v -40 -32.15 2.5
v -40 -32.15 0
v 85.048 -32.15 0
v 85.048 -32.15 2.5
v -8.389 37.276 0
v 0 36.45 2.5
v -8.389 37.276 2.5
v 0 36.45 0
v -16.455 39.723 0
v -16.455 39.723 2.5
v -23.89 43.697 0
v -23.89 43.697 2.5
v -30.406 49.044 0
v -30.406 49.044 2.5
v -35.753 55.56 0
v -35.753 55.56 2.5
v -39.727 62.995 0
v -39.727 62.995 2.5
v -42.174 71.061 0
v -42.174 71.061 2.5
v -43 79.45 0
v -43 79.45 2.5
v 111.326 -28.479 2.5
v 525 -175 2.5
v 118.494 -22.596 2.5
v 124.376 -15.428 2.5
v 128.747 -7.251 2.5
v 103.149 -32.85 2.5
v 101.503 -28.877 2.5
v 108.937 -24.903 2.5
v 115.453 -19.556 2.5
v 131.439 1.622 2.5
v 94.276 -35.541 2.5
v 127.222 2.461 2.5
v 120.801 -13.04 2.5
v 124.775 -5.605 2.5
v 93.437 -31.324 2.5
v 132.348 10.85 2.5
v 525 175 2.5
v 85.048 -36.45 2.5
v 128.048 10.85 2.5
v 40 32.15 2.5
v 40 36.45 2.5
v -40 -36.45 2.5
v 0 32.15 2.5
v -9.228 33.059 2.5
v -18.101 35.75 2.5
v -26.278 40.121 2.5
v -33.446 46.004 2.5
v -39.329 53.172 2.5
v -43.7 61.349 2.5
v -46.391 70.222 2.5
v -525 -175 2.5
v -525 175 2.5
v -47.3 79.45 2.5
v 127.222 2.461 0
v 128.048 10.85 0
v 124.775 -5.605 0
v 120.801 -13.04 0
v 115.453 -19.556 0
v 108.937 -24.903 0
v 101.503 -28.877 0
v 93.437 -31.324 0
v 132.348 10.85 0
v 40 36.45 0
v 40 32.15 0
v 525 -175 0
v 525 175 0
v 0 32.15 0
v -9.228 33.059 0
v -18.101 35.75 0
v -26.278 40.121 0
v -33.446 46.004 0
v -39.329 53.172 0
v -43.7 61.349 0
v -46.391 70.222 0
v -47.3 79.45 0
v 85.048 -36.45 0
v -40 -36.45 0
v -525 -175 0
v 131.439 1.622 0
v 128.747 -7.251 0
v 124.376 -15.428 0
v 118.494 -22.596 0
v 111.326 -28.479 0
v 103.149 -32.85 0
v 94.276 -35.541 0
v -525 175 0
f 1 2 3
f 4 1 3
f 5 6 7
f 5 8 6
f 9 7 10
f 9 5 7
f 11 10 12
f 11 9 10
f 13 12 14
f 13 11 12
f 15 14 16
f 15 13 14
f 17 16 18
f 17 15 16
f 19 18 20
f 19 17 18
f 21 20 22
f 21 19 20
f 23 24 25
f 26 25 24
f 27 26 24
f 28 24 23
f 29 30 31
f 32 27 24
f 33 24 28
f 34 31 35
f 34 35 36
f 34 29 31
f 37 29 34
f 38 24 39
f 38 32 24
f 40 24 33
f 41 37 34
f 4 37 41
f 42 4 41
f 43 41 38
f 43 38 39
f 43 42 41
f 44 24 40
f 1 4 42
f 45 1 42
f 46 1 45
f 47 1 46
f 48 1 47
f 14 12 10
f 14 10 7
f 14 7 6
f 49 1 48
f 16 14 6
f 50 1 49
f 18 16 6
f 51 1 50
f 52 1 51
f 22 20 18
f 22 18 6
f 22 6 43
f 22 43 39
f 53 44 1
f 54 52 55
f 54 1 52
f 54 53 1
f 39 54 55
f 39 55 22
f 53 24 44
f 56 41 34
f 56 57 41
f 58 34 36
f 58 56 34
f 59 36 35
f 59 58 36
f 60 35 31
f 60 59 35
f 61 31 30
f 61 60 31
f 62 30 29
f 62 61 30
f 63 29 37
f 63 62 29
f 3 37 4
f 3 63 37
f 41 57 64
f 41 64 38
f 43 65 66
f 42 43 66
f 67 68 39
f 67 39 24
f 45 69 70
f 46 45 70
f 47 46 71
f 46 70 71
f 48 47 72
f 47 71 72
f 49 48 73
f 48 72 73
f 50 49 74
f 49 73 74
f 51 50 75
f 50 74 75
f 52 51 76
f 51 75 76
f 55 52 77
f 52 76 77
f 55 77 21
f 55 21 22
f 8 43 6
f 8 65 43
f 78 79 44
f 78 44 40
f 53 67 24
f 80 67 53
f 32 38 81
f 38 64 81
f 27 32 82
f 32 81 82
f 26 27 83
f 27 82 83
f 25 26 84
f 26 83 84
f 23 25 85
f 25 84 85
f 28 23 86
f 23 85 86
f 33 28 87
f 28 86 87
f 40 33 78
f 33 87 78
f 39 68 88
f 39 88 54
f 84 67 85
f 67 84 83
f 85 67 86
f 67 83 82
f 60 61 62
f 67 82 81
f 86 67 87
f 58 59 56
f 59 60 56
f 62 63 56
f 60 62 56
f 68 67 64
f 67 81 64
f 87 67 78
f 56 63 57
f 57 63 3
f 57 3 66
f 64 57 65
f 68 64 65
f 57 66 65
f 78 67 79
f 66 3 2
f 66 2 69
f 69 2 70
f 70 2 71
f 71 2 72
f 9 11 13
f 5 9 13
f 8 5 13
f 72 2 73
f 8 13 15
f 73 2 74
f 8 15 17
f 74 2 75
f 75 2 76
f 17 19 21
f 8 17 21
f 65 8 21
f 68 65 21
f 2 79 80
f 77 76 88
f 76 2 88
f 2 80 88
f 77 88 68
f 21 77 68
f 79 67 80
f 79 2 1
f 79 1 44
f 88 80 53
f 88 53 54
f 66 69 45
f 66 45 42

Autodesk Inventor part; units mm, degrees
ref_plane "YZ Plane" through (0, 0, 0) normal (1, 0, 0) x (0, 1, 0)
ref_plane "XZ Plane" through (0, 0, 0) normal (0, 1, 0) x (-1, 0, 0)
ref_plane "XY Plane" through (0, 0, 0) normal (0, 0, 1) x (1, 0, 0)
sketch "Sketch1" plane through (0, 0, 0) normal (0, 0, 1) x (1, 0, 0)
  line L0 (-525, 175) -> (525, 175) projected
  line L1 (-525, -175) -> (-525, 175) projected
  line L2 (525, -175) -> (-525, -175) projected
  line L3 (525, 175) -> (525, -175) projected
  arc A0 (-434.5, -36.45) -> (-475.35, -77.3) centre (-434.5, -77.3) ccw projected
  line L4 (-475.35, -85.5) -> (-475.35, -77.3) projected
  arc A1 (-475.35, -85.5) -> (-434.5, -126.35) centre (-434.5, -85.5) ccw projected
  line L5 (434.5, -126.35) -> (-434.5, -126.35) projected
  arc A2 (434.5, -126.35) -> (475.35, -85.5) centre (434.5, -85.5) ccw projected
  line L6 (475.35, -65.8667) -> (475.35, -85.5) projected
  arc A3 (475.35, -65.8667) -> (434.5, -25.0167) centre (434.5, -65.8667) ccw projected
  line L7 (-445.75, -25.0167) -> (434.5, -25.0167) projected
  arc A4 (-445.75, -25.0167) -> (-486.6, -65.8667) centre (-445.75, -65.8667) ccw projected
  line L8 (-486.6, -96.25) -> (-486.6, -65.8667) projected
  arc A5 (-486.6, -96.25) -> (-445.75, -137.1) centre (-445.75, -96.25) ccw projected
  line L9 (445.75, -137.1) -> (-445.75, -137.1) projected
  arc A6 (445.75, -137.1) -> (486.6, -96.25) centre (445.75, -96.25) ccw projected
  line L10 (486.6, -54.4333) -> (486.6, -96.25) projected
  arc A7 (486.6, -54.4333) -> (445.75, -13.5833) centre (445.75, -54.4333) ccw projected
  line L11 (-457, -13.5833) -> (445.75, -13.5833) projected
  arc A8 (-457, -13.5833) -> (-497.85, -54.4333) centre (-457, -54.4333) ccw projected
  line L12 (-497.85, -107) -> (-497.85, -54.4333) projected
  arc A9 (-497.85, -107) -> (-457, -147.85) centre (-457, -107) ccw projected
  line L13 (457, -147.85) -> (-457, -147.85) projected
  arc A10 (457, -147.85) -> (497.85, -107) centre (457, -107) ccw projected
  line L14 (497.85, -43) -> (497.85, -107) projected
  arc A11 (497.85, -43) -> (457, -2.15) centre (457, -43) ccw projected
  line L15 (-457, -2.15) -> (457, -2.15) projected
  arc A12 (-502.15, 43) -> (-457, -2.15) centre (-457, 43) ccw projected
  line L16 (-502.15, 107) -> (-502.15, 43) projected
  arc A13 (-457, 152.15) -> (-502.15, 107) centre (-457, 107) ccw projected
  line L17 (457, 152.15) -> (-457, 152.15) projected
  arc A14 (502.15, 107) -> (457, 152.15) centre (457, 107) ccw projected
  line L18 (502.15, 54.4333) -> (502.15, 107) projected
  arc A15 (457, 9.2833) -> (502.15, 54.4333) centre (457, 54.4333) ccw projected
  line L19 (-445.75, 9.2833) -> (457, 9.2833) projected
  arc A16 (-490.9, 54.4333) -> (-445.75, 9.2833) centre (-445.75, 54.4333) ccw projected
  line L20 (-490.9, 96.25) -> (-490.9, 54.4333) projected
  arc A17 (-445.75, 141.4) -> (-490.9, 96.25) centre (-445.75, 96.25) ccw projected
  line L21 (445.75, 141.4) -> (-445.75, 141.4) projected
  arc A18 (490.9, 96.25) -> (445.75, 141.4) centre (445.75, 96.25) ccw projected
  line L22 (490.9, 65.8667) -> (490.9, 96.25) projected
  arc A19 (445.75, 20.7167) -> (490.9, 65.8667) centre (445.75, 65.8667) ccw projected
  line L23 (-434.5, 20.7167) -> (445.75, 20.7167) projected
  arc A20 (-479.65, 65.8667) -> (-434.5, 20.7167) centre (-434.5, 65.8667) ccw projected
  line L24 (-479.65, 85.5) -> (-479.65, 65.8667) projected
  arc A21 (-434.5, 130.65) -> (-479.65, 85.5) centre (-434.5, 85.5) ccw projected
  line L25 (434.5, 130.65) -> (-434.5, 130.65) projected
  arc A22 (479.65, 85.5) -> (434.5, 130.65) centre (434.5, 85.5) ccw projected
  line L26 (479.65, 77.3) -> (479.65, 85.5) projected
  arc A23 (434.5, 32.15) -> (479.65, 77.3) centre (434.5, 77.3) ccw projected
  line L27 (0, 32.15) -> (434.5, 32.15) projected
  line L28 (0, 36.45) -> (0, 32.15) projected
  line L29 (434.5, 36.45) -> (0, 36.45) projected
  arc A24 (434.5, 36.45) -> (475.35, 77.3) centre (434.5, 77.3) ccw projected
  line L30 (475.35, 85.5) -> (475.35, 77.3) projected
  arc A25 (475.35, 85.5) -> (434.5, 126.35) centre (434.5, 85.5) ccw projected
  line L31 (-434.5, 126.35) -> (434.5, 126.35) projected
  arc A26 (-434.5, 126.35) -> (-475.35, 85.5) centre (-434.5, 85.5) ccw projected
  line L32 (-475.35, 65.8667) -> (-475.35, 85.5) projected
  arc A27 (-475.35, 65.8667) -> (-434.5, 25.0167) centre (-434.5, 65.8667) ccw projected
  line L33 (445.75, 25.0167) -> (-434.5, 25.0167) projected
  arc A28 (445.75, 25.0167) -> (486.6, 65.8667) centre (445.75, 65.8667) ccw projected
  line L34 (486.6, 96.25) -> (486.6, 65.8667) projected
  arc A29 (486.6, 96.25) -> (445.75, 137.1) centre (445.75, 96.25) ccw projected
  line L35 (-445.75, 137.1) -> (445.75, 137.1) projected
  arc A30 (-445.75, 137.1) -> (-486.6, 96.25) centre (-445.75, 96.25) ccw projected
  line L36 (-486.6, 54.4333) -> (-486.6, 96.25) projected
  arc A31 (-486.6, 54.4333) -> (-445.75, 13.5833) centre (-445.75, 54.4333) ccw projected
  line L37 (457, 13.5833) -> (-445.75, 13.5833) projected
  arc A32 (457, 13.5833) -> (497.85, 54.4333) centre (457, 54.4333) ccw projected
  line L38 (497.85, 107) -> (497.85, 54.4333) projected
  arc A33 (497.85, 107) -> (457, 147.85) centre (457, 107) ccw projected
  line L39 (-457, 147.85) -> (457, 147.85) projected
  arc A34 (-457, 147.85) -> (-497.85, 107) centre (-457, 107) ccw projected
  line L40 (-497.85, 43) -> (-497.85, 107) projected
  arc A35 (-497.85, 43) -> (-457, 2.15) centre (-457, 43) ccw projected
  line L41 (457, 2.15) -> (-457, 2.15) projected
  arc A36 (502.15, -43) -> (457, 2.15) centre (457, -43) ccw projected
  line L42 (502.15, -107) -> (502.15, -43) projected
  arc A37 (457, -152.15) -> (502.15, -107) centre (457, -107) ccw projected
  line L43 (-457, -152.15) -> (457, -152.15) projected
  arc A38 (-502.15, -107) -> (-457, -152.15) centre (-457, -107) ccw projected
  line L44 (-502.15, -54.4333) -> (-502.15, -107) projected
  arc A39 (-457, -9.2833) -> (-502.15, -54.4333) centre (-457, -54.4333) ccw projected
  line L45 (445.75, -9.2833) -> (-457, -9.2833) projected
  arc A40 (490.9, -54.4333) -> (445.75, -9.2833) centre (445.75, -54.4333) ccw projected
  line L46 (490.9, -96.25) -> (490.9, -54.4333) projected
  arc A41 (445.75, -141.4) -> (490.9, -96.25) centre (445.75, -96.25) ccw projected
  line L47 (-445.75, -141.4) -> (445.75, -141.4) projected
  arc A42 (-490.9, -96.25) -> (-445.75, -141.4) centre (-445.75, -96.25) ccw projected
  line L48 (-490.9, -65.8667) -> (-490.9, -96.25) projected
  arc A43 (-445.75, -20.7167) -> (-490.9, -65.8667) centre (-445.75, -65.8667) ccw projected
  line L49 (434.5, -20.7167) -> (-445.75, -20.7167) projected
  arc A44 (479.65, -65.8667) -> (434.5, -20.7167) centre (434.5, -65.8667) ccw projected
  line L50 (479.65, -85.5) -> (479.65, -65.8667) projected
  arc A45 (434.5, -130.65) -> (479.65, -85.5) centre (434.5, -85.5) ccw projected
  line L51 (-434.5, -130.65) -> (434.5, -130.65) projected
  arc A46 (-479.65, -85.5) -> (-434.5, -130.65) centre (-434.5, -85.5) ccw projected
  line L52 (-479.65, -77.3) -> (-479.65, -85.5) projected
  arc A47 (-434.5, -32.15) -> (-479.65, -77.3) centre (-434.5, -77.3) ccw projected
  line L53 (0, -32.15) -> (-434.5, -32.15) projected
  line L54 (0, -36.45) -> (0, -32.15) projected
  line L55 (-434.5, -36.45) -> (0, -36.45) projected
  line L56 (-525, 175) -> (525, 175) projected
  line L57 (-525, -175) -> (-525, 175) projected
  line L58 (525, -175) -> (-525, -175) projected
  line L59 (525, 175) -> (525, -175) projected
  arc A48 (-434.5, -36.45) -> (-475.35, -77.3) centre (-434.5, -77.3) ccw projected
  line L60 (-475.35, -85.5) -> (-475.35, -77.3) projected
  arc A49 (-475.35, -85.5) -> (-434.5, -126.35) centre (-434.5, -85.5) ccw projected
  line L61 (434.5, -126.35) -> (-434.5, -126.35) projected
  arc A50 (434.5, -126.35) -> (475.35, -85.5) centre (434.5, -85.5) ccw projected
  line L62 (475.35, -65.8667) -> (475.35, -85.5) projected
  arc A51 (475.35, -65.8667) -> (434.5, -25.0167) centre (434.5, -65.8667) ccw projected
  line L63 (-445.75, -25.0167) -> (434.5, -25.0167) projected
  arc A52 (-445.75, -25.0167) -> (-486.6, -65.8667) centre (-445.75, -65.8667) ccw projected
  line L64 (-486.6, -96.25) -> (-486.6, -65.8667) projected
  arc A53 (-486.6, -96.25) -> (-445.75, -137.1) centre (-445.75, -96.25) ccw projected
  line L65 (445.75, -137.1) -> (-445.75, -137.1) projected
  arc A54 (445.75, -137.1) -> (486.6, -96.25) centre (445.75, -96.25) ccw projected
  line L66 (486.6, -54.4333) -> (486.6, -96.25) projected
  arc A55 (486.6, -54.4333) -> (445.75, -13.5833) centre (445.75, -54.4333) ccw projected
  line L67 (-457, -13.5833) -> (445.75, -13.5833) projected
  arc A56 (-457, -13.5833) -> (-497.85, -54.4333) centre (-457, -54.4333) ccw projected
  line L68 (-497.85, -107) -> (-497.85, -54.4333) projected
  arc A57 (-497.85, -107) -> (-457, -147.85) centre (-457, -107) ccw projected
  line L69 (457, -147.85) -> (-457, -147.85) projected
  arc A58 (457, -147.85) -> (497.85, -107) centre (457, -107) ccw projected
  line L70 (497.85, -43) -> (497.85, -107) projected
  arc A59 (497.85, -43) -> (457, -2.15) centre (457, -43) ccw projected
  line L71 (-457, -2.15) -> (457, -2.15) projected
  arc A60 (-502.15, 43) -> (-457, -2.15) centre (-457, 43) ccw projected
  line L72 (-502.15, 107) -> (-502.15, 43) projected
  arc A61 (-457, 152.15) -> (-502.15, 107) centre (-457, 107) ccw projected
  line L73 (457, 152.15) -> (-457, 152.15) projected
  arc A62 (502.15, 107) -> (457, 152.15) centre (457, 107) ccw projected
  line L74 (502.15, 54.4333) -> (502.15, 107) projected
  arc A63 (457, 9.2833) -> (502.15, 54.4333) centre (457, 54.4333) ccw projected
  line L75 (-445.75, 9.2833) -> (457, 9.2833) projected
  arc A64 (-490.9, 54.4333) -> (-445.75, 9.2833) centre (-445.75, 54.4333) ccw projected
  line L76 (-490.9, 96.25) -> (-490.9, 54.4333) projected
  arc A65 (-445.75, 141.4) -> (-490.9, 96.25) centre (-445.75, 96.25) ccw projected
  line L77 (445.75, 141.4) -> (-445.75, 141.4) projected
  arc A66 (490.9, 96.25) -> (445.75, 141.4) centre (445.75, 96.25) ccw projected
  line L78 (490.9, 65.8667) -> (490.9, 96.25) projected
  arc A67 (445.75, 20.7167) -> (490.9, 65.8667) centre (445.75, 65.8667) ccw projected
  line L79 (-434.5, 20.7167) -> (445.75, 20.7167) projected
  arc A68 (-479.65, 65.8667) -> (-434.5, 20.7167) centre (-434.5, 65.8667) ccw projected
  line L80 (-479.65, 85.5) -> (-479.65, 65.8667) projected
  arc A69 (-434.5, 130.65) -> (-479.65, 85.5) centre (-434.5, 85.5) ccw projected
  line L81 (434.5, 130.65) -> (-434.5, 130.65) projected
  arc A70 (479.65, 85.5) -> (434.5, 130.65) centre (434.5, 85.5) ccw projected
  line L82 (479.65, 77.3) -> (479.65, 85.5) projected
  arc A71 (434.5, 32.15) -> (479.65, 77.3) centre (434.5, 77.3) ccw projected
  line L83 (0, 32.15) -> (434.5, 32.15) projected
  line L84 (0, 36.45) -> (0, 32.15) projected
  line L85 (434.5, 36.45) -> (0, 36.45) projected
  arc A72 (434.5, 36.45) -> (475.35, 77.3) centre (434.5, 77.3) ccw projected
  line L86 (475.35, 85.5) -> (475.35, 77.3) projected
  arc A73 (475.35, 85.5) -> (434.5, 126.35) centre (434.5, 85.5) ccw projected
  line L87 (-434.5, 126.35) -> (434.5, 126.35) projected
  arc A74 (-434.5, 126.35) -> (-475.35, 85.5) centre (-434.5, 85.5) ccw projected
  line L88 (-475.35, 65.8667) -> (-475.35, 85.5) projected
  arc A75 (-475.35, 65.8667) -> (-434.5, 25.0167) centre (-434.5, 65.8667) ccw projected
  line L89 (445.75, 25.0167) -> (-434.5, 25.0167) projected
  arc A76 (445.75, 25.0167) -> (486.6, 65.8667) centre (445.75, 65.8667) ccw projected
  line L90 (486.6, 96.25) -> (486.6, 65.8667) projected
  arc A77 (486.6, 96.25) -> (445.75, 137.1) centre (445.75, 96.25) ccw projected
  line L91 (-445.75, 137.1) -> (445.75, 137.1) projected
  arc A78 (-445.75, 137.1) -> (-486.6, 96.25) centre (-445.75, 96.25) ccw projected
  line L92 (-486.6, 54.4333) -> (-486.6, 96.25) projected
  arc A79 (-486.6, 54.4333) -> (-445.75, 13.5833) centre (-445.75, 54.4333) ccw projected
  line L93 (457, 13.5833) -> (-445.75, 13.5833) projected
  arc A80 (457, 13.5833) -> (497.85, 54.4333) centre (457, 54.4333) ccw projected
  line L94 (497.85, 107) -> (497.85, 54.4333) projected
  arc A81 (497.85, 107) -> (457, 147.85) centre (457, 107) ccw projected
  line L95 (-457, 147.85) -> (457, 147.85) projected
  arc A82 (-457, 147.85) -> (-497.85, 107) centre (-457, 107) ccw projected
  line L96 (-497.85, 43) -> (-497.85, 107) projected
  arc A83 (-497.85, 43) -> (-457, 2.15) centre (-457, 43) ccw projected
  line L97 (457, 2.15) -> (-457, 2.15) projected
  arc A84 (502.15, -43) -> (457, 2.15) centre (457, -43) ccw projected
  line L98 (502.15, -107) -> (502.15, -43) projected
  arc A85 (457, -152.15) -> (502.15, -107) centre (457, -107) ccw projected
  line L99 (-457, -152.15) -> (457, -152.15) projected
  arc A86 (-502.15, -107) -> (-457, -152.15) centre (-457, -107) ccw projected
  line L100 (-502.15, -54.4333) -> (-502.15, -107) projected
  arc A87 (-457, -9.2833) -> (-502.15, -54.4333) centre (-457, -54.4333) ccw projected
  line L101 (445.75, -9.2833) -> (-457, -9.2833) projected
  arc A88 (490.9, -54.4333) -> (445.75, -9.2833) centre (445.75, -54.4333) ccw projected
  line L102 (490.9, -96.25) -> (490.9, -54.4333) projected
  arc A89 (445.75, -141.4) -> (490.9, -96.25) centre (445.75, -96.25) ccw projected
  line L103 (-445.75, -141.4) -> (445.75, -141.4) projected
  arc A90 (-490.9, -96.25) -> (-445.75, -141.4) centre (-445.75, -96.25) ccw projected
  line L104 (-490.9, -65.8667) -> (-490.9, -96.25) projected
  arc A91 (-445.75, -20.7167) -> (-490.9, -65.8667) centre (-445.75, -65.8667) ccw projected
  line L105 (434.5, -20.7167) -> (-445.75, -20.7167) projected
  arc A92 (479.65, -65.8667) -> (434.5, -20.7167) centre (434.5, -65.8667) ccw projected
  line L106 (479.65, -85.5) -> (479.65, -65.8667) projected
  arc A93 (434.5, -130.65) -> (479.65, -85.5) centre (434.5, -85.5) ccw projected
  line L107 (-434.5, -130.65) -> (434.5, -130.65) projected
  arc A94 (-479.65, -85.5) -> (-434.5, -130.65) centre (-434.5, -85.5) ccw projected
  line L108 (-479.65, -77.3) -> (-479.65, -85.5) projected
  arc A95 (-434.5, -32.15) -> (-479.65, -77.3) centre (-434.5, -77.3) ccw projected
  line L109 (0, -32.15) -> (-434.5, -32.15) projected
  line L110 (0, -36.45) -> (0, -32.15) projected
  line L111 (-434.5, -36.45) -> (0, -36.45) projected
  line L112 (0, -32.15) -> (0, 10.85) construction
  line L113 (18.1865, 10.85) -> (0, 10.85) construction
  line L114 (0, -36.45) -> (0, 10.85) construction
  line L115 (25.3634, 10.85) -> (0, 10.85) construction
  arc A96 (-43, 79.45) -> (0, 36.45) centre (0, 79.45) ccw
  line L116 (0, 36.45) -> (0, 79.45) construction
  line L117 (-43, 79.45) -> (0, 79.45) construction
  arc A97 (-47.3, 79.45) -> (0, 32.15) centre (0, 79.45) ccw
  line L118 (0, 32.15) -> (0, 79.45) construction
  line L119 (-47.3, 79.45) -> (0, 79.45) construction
  line L120 (-43, 79.45) -> (-43, 175)
  line L121 (-47.3, 79.45) -> (-47.3, 175)
  line L122 (85.0479, 2.11) -> (85.0479, -106.33) projected
  line L123 (0, -36.45) -> (85.0479, -36.45)
  line L124 (0, -32.15) -> (85.0479, -32.15)
  arc A98 (85.0479, -32.15) -> (128.0479, 10.85) centre (85.0479, 10.85) ccw
  line L125 (85.0479, -32.15) -> (85.0479, 10.85) construction
  line L126 (128.0479, 10.85) -> (85.0479, 10.85) construction
  arc A99 (85.0479, -36.45) -> (132.3479, 10.85) centre (85.0479, 10.85) ccw
  line L127 (85.0479, -36.45) -> (85.0479, 10.85) construction
  line L128 (132.3479, 10.85) -> (85.0479, 10.85) construction
  line L129 (128.0479, 10.85) -> (128.0479, 175)
  line L130 (132.3479, 10.85) -> (132.3479, 175)
  line L131 (0, 36.45) -> (0, 32.15)
  line L132 (0, -36.45) -> (0, -32.15)
  line L133 (-40, -32.15) -> (-40, -36.45)
  line L134 (40, 36.45) -> (40, 32.15)
  point P0 (0, 0)
  point P1 (128.0479, 175)
  point P2 (132.3479, 175)
  dimension "d4" = 90
  dimension "d6" = 90
  dimension "d7" = 43
  dimension "d8" = 90
  dimension "d9" = 47.3
  dimension "d10" = 90
  dimension "d11" = 43
  dimension "d12" = 90
  dimension "d13" = 47.3
  dimension "d14" = 90
  dimension "d17" = 40
  dimension "d18" = 40
extrude "Extrusion1" add sketch "Sketch1" along normal blind 2.5 contours L0 L121 L17 A13 L16 A12 L15 L122 L45 A39 L44 A38 L43 A37 L42 A36 L41 A99 L19 A15 L18 A14 L130 L3 L2 L1 | L0 L129 L17 L120 | L121 L39 A34 L40 A35 L41 A98 L15 A12 L16 A13 L17 | L17 L129 L39 L120 | L121 L21 A17 L20 A16 L19 A98 L41 A35 L40 A34 L39 | L39 L129 L21 L120 | L121 L35 A30 L36 A31 L37 L129 A98 L19 A16 L20 A17 L21 | L17 A14 L18 A15 L19 A99 L130 L37 A32 L38 A33 L39 | L21 L129 L35 L120 | L121 L25 A21 L24 A20 L23 L129 L37 A31 L36 A30 L35 | L39 A33 L38 A32 L37 L130 L23 A19 L22 A18 L21 | L35 L129 L25 L120 | L121 L31 A26 L32 A27 L33 L129 L23 A20 L24 A21 L25 | L21 A18 L22 A19 L23 L130 L33 A28 L34 A29 L35 | L25 L129 L31 L120 | L15 A98 L45 L122 | L121 A97 L27 L129 L33 A27 L32 A26 L31 | L35 A29 L34 A28 L33 L130 L27 A23 L26 A22 L25 | L31 L129 L29 A96 L120 | L122 L11 A8 L12 A9 L13 A10 L14 A11 L15 A99 L41 A36 L42 A37 L43 A38 L44 A39 L45 | L45 A98 L11 L122 | L25 A22 L26 A23 L27 L130 L29 A24 L30 A25 L31 | L15 A11 L14 A10 L13 A9 L12 A8 L11 L122 L49 A43 L48 A42 L47 A41 L46 A40 L45 A99 | L11 A98 L49 L122 | L31 A25 L30 A24 L29 L130 | L129 L27 L134 L29 | L45 A40 L46 A41 L47 A42 L48 A43 L49 L122 L7 A4 L8 A5 L9 A6 L10 A7 L11 A99 | L49 A98 L7 L122 | L11 A7 L10 A6 L9 A5 L8 A4 L7 L122 L124 L53 A47 L52 A46 L51 A45 L50 A44 L49 A99 | L7 A98 L122 | L49 A44 L50 A45 L51 A46 L52 A47 L53 L133 L55 A0 L4 A1 L5 A2 L6 A3 L7 A99 | L7 A3 L6 A2 L5 A1 L4 A0 L55 L123 A99
sketch "Sketch2" plane through (128.0479, 10.85, 0) normal (1, 0, 0) x (0, 0, -1)
  line L0 (0, 0) -> (0, 164.15) projected
  line L1 (0, 164.15) -> (-2.5, 164.15) projected
  line L2 (-2.5, 0) -> (-2.5, 164.15) projected
  line L3 (0, 0) -> (-2.5, 0) projected
  point P0 (0, -10.85)
extrude "Extrusion2" add sketch "Sketch2" along normal blind 4.3
sketch "Sketch3" plane through (-47.3, 79.45, 0) normal (1, 0, 0) x (0, 0, -1)
  line L0 (0, 0) -> (0, 95.55) projected
  line L1 (0, 95.55) -> (-2.5, 95.55) projected
  line L2 (-2.5, 0) -> (-2.5, 95.55) projected
  line L3 (0, 0) -> (-2.5, 0) projected
  point P0 (0, -79.45)
extrude "Extrusion3" add sketch "Sketch3" along normal blind 4.3
properties part number "btwnFerriteAndCoil" material "LCP Plastic"
